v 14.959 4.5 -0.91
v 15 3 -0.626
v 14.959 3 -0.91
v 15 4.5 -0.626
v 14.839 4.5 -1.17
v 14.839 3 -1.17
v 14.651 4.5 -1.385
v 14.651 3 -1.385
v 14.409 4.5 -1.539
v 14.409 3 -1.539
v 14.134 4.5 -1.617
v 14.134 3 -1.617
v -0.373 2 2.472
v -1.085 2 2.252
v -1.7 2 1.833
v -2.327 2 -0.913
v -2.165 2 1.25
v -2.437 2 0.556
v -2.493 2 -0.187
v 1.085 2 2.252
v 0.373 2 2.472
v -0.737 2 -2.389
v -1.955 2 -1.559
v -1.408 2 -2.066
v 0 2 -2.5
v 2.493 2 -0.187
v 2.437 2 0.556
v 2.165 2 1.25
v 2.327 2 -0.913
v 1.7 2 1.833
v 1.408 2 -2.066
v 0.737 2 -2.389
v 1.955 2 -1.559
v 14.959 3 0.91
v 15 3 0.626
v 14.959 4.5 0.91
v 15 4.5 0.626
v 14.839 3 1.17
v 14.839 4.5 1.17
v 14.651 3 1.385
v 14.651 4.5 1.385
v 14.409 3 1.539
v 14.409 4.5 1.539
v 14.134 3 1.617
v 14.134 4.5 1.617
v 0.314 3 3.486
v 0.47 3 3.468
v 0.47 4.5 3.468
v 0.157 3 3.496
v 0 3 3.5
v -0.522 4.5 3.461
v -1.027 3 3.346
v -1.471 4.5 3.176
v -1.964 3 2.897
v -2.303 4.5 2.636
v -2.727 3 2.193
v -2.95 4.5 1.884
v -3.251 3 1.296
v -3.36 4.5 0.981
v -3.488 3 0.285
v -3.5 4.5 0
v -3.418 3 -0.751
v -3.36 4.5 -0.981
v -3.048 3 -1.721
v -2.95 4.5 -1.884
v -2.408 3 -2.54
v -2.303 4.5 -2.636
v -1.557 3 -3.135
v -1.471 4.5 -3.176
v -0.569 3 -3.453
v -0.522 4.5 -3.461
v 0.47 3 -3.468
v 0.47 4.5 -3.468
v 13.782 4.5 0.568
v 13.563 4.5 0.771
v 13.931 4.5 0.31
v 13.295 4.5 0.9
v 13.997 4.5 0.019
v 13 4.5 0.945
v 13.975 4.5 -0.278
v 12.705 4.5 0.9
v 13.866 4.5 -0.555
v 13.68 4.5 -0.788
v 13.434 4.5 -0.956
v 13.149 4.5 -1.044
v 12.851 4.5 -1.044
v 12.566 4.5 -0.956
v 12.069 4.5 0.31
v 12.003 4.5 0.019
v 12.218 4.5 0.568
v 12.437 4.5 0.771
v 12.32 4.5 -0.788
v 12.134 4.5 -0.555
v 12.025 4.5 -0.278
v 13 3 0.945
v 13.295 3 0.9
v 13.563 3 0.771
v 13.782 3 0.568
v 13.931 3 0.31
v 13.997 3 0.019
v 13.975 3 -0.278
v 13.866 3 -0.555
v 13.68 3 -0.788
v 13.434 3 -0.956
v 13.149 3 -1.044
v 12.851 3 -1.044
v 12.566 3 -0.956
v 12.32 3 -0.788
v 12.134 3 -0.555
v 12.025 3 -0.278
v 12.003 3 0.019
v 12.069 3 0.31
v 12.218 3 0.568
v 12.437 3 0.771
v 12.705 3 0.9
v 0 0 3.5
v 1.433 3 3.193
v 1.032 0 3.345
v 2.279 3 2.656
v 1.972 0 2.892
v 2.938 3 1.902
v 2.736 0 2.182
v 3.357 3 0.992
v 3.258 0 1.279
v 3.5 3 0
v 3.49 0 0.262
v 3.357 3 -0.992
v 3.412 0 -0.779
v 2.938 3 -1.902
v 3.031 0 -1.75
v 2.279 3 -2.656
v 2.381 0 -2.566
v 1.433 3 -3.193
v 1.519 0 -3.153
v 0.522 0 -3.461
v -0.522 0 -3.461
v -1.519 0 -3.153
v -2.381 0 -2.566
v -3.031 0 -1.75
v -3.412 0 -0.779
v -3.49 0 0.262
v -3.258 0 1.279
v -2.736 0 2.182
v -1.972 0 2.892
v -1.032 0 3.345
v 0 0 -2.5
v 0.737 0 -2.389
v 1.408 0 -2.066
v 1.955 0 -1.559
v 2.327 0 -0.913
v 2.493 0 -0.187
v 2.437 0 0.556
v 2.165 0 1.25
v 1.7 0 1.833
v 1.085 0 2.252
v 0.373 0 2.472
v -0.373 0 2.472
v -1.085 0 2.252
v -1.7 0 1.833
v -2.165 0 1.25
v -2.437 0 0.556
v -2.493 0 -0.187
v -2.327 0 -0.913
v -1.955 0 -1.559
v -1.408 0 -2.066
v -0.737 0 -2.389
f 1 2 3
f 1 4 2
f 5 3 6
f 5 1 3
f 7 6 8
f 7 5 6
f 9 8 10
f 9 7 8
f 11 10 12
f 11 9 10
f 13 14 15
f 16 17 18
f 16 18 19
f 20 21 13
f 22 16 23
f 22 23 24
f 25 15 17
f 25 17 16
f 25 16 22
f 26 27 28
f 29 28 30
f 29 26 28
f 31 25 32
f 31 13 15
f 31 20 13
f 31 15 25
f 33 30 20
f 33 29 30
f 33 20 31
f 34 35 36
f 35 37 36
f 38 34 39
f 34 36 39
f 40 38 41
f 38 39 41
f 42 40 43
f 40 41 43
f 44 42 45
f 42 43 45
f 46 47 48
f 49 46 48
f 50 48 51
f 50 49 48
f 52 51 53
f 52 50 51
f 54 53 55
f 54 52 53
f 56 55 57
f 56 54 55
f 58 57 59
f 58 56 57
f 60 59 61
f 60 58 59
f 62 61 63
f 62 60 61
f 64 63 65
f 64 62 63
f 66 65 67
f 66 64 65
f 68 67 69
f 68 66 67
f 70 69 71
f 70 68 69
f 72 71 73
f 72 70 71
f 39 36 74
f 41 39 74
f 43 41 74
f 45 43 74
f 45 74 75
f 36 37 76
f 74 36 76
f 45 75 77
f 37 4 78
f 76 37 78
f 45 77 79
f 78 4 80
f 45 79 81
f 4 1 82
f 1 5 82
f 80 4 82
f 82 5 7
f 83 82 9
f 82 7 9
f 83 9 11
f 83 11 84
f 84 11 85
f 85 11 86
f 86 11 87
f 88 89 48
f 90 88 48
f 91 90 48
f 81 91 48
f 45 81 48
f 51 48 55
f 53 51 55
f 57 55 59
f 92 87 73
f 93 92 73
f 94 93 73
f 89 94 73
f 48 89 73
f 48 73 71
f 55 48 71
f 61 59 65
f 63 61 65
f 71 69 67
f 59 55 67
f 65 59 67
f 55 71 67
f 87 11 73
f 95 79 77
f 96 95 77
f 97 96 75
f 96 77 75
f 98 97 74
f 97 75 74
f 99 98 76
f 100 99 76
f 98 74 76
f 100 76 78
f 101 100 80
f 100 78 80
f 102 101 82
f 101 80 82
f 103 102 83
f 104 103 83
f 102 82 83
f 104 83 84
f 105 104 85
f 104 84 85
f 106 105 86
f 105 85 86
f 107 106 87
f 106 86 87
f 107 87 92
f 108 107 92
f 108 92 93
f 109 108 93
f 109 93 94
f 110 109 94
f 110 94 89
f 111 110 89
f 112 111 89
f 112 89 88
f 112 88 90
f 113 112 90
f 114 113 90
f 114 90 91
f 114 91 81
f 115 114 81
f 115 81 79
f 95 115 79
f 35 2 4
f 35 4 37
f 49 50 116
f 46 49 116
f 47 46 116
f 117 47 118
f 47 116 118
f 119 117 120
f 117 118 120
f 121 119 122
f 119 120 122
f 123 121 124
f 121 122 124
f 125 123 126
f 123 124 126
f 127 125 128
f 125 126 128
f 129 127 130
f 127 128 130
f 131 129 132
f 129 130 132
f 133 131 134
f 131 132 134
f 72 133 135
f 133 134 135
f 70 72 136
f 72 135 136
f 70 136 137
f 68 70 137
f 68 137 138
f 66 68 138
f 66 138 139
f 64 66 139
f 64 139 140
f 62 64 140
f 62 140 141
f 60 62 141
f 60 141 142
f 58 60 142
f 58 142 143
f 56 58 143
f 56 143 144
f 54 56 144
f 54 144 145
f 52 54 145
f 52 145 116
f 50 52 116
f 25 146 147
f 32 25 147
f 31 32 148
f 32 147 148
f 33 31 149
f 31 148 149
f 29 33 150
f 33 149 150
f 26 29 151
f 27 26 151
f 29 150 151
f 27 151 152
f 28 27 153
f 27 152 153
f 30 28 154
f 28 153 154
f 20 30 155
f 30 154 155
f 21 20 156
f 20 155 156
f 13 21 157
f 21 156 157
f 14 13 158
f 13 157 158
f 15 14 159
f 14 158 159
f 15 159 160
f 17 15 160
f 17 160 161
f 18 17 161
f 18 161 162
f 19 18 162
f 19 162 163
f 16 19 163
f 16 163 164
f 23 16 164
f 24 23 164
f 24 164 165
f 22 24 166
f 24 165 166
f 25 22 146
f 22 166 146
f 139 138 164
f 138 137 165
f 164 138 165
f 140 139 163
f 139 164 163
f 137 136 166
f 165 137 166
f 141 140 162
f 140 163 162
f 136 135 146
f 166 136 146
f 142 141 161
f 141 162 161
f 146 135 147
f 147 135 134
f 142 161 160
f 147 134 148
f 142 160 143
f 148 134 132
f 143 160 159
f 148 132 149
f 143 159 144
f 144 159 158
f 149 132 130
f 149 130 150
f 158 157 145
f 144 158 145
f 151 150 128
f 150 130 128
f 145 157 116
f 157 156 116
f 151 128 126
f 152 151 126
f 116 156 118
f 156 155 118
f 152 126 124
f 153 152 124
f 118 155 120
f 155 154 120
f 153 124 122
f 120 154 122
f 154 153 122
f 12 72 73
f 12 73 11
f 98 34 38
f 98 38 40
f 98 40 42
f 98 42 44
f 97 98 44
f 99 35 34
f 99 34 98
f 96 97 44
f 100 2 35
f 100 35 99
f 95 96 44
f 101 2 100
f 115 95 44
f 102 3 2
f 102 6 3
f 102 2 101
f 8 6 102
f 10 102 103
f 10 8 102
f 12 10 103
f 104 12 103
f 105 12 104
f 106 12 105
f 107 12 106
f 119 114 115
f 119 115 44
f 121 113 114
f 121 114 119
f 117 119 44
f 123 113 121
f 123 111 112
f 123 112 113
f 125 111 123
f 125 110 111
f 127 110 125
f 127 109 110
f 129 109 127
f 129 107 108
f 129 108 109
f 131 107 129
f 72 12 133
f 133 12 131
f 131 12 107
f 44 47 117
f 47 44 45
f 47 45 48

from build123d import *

# Parameters (mm, degrees)
SCHIZZO1_R                   = 3.5
ESTRUSIONE_ESTRUSIONE1_DEPTH = 3
ESTRUSIONE_ESTRUSIONE2_DEPTH = 1.5
SCHIZZO3_R                   = 2.5
TAGLIO_ESTRUSIONE1_DEPTH     = 2
RACCORDO1_R                  = 1
SKETCH2_R                    = 1
CUT_EXTRUDE1_DEPTH           = 17.046806536


with BuildPart() as part:
    # Schizzo1 → Estrusione-Estrusione1 (new body)
    with BuildSketch(Plane(origin=(0, 0, 0), x_dir=(1, 0, 0), z_dir=(0, 1, 0))):
        with Locations(Location((0, 0, 0), (0, 0, 270))):
            Circle(SCHIZZO1_R)
    extrude(amount=ESTRUSIONE_ESTRUSIONE1_DEPTH)

    # Schizzo2 → Estrusione-Estrusione2 (add)
    with BuildSketch(Plane(origin=(0, 3, 0), x_dir=(1, 0, 0), z_dir=(0, 1, 0))):
        with BuildLine():
            Line((15, 1.5), (15, -1.5))
            Line((15, -1.5), (0.469834495, -3.468321719))
            ThreePointArc((0.469834495, -3.468321719), (-3.5, 0), (0.469834495, 3.468321719))
            Line((0.469834495, 3.468321719), (15, 1.5))
        make_face()
    extrude(amount=ESTRUSIONE_ESTRUSIONE2_DEPTH)

    # Schizzo3 → Taglio-Estrusione1 (cut)
    with BuildSketch(Plane.XZ):
        with Locations(Location((0, 0, 0), (0, 0, 270))):
            Circle(SCHIZZO3_R)
    extrude(amount=-TAGLIO_ESTRUSIONE1_DEPTH, mode=Mode.SUBTRACT)

    # Raccordo1
    raccordo1_edges = [part.edges().sort_by_distance(p)[0] for p in [
        (15, 3.75, 1.5),
        (15, 3.75, -1.5),
    ]]
    fillet(raccordo1_edges, radius=RACCORDO1_R)

    # Sketch2 → Cut-Extrude1 (cut, through all)
    with BuildSketch(Plane(origin=(0, 4.5, 0), x_dir=(1, 0, 0), z_dir=(0, 1, 0))):
        with Locations(Location((13, 0.055401887, 0), (0, 0, 270))):
            Circle(SKETCH2_R)
    extrude(amount=-CUT_EXTRUDE1_DEPTH, mode=Mode.SUBTRACT)


solid = part.part
